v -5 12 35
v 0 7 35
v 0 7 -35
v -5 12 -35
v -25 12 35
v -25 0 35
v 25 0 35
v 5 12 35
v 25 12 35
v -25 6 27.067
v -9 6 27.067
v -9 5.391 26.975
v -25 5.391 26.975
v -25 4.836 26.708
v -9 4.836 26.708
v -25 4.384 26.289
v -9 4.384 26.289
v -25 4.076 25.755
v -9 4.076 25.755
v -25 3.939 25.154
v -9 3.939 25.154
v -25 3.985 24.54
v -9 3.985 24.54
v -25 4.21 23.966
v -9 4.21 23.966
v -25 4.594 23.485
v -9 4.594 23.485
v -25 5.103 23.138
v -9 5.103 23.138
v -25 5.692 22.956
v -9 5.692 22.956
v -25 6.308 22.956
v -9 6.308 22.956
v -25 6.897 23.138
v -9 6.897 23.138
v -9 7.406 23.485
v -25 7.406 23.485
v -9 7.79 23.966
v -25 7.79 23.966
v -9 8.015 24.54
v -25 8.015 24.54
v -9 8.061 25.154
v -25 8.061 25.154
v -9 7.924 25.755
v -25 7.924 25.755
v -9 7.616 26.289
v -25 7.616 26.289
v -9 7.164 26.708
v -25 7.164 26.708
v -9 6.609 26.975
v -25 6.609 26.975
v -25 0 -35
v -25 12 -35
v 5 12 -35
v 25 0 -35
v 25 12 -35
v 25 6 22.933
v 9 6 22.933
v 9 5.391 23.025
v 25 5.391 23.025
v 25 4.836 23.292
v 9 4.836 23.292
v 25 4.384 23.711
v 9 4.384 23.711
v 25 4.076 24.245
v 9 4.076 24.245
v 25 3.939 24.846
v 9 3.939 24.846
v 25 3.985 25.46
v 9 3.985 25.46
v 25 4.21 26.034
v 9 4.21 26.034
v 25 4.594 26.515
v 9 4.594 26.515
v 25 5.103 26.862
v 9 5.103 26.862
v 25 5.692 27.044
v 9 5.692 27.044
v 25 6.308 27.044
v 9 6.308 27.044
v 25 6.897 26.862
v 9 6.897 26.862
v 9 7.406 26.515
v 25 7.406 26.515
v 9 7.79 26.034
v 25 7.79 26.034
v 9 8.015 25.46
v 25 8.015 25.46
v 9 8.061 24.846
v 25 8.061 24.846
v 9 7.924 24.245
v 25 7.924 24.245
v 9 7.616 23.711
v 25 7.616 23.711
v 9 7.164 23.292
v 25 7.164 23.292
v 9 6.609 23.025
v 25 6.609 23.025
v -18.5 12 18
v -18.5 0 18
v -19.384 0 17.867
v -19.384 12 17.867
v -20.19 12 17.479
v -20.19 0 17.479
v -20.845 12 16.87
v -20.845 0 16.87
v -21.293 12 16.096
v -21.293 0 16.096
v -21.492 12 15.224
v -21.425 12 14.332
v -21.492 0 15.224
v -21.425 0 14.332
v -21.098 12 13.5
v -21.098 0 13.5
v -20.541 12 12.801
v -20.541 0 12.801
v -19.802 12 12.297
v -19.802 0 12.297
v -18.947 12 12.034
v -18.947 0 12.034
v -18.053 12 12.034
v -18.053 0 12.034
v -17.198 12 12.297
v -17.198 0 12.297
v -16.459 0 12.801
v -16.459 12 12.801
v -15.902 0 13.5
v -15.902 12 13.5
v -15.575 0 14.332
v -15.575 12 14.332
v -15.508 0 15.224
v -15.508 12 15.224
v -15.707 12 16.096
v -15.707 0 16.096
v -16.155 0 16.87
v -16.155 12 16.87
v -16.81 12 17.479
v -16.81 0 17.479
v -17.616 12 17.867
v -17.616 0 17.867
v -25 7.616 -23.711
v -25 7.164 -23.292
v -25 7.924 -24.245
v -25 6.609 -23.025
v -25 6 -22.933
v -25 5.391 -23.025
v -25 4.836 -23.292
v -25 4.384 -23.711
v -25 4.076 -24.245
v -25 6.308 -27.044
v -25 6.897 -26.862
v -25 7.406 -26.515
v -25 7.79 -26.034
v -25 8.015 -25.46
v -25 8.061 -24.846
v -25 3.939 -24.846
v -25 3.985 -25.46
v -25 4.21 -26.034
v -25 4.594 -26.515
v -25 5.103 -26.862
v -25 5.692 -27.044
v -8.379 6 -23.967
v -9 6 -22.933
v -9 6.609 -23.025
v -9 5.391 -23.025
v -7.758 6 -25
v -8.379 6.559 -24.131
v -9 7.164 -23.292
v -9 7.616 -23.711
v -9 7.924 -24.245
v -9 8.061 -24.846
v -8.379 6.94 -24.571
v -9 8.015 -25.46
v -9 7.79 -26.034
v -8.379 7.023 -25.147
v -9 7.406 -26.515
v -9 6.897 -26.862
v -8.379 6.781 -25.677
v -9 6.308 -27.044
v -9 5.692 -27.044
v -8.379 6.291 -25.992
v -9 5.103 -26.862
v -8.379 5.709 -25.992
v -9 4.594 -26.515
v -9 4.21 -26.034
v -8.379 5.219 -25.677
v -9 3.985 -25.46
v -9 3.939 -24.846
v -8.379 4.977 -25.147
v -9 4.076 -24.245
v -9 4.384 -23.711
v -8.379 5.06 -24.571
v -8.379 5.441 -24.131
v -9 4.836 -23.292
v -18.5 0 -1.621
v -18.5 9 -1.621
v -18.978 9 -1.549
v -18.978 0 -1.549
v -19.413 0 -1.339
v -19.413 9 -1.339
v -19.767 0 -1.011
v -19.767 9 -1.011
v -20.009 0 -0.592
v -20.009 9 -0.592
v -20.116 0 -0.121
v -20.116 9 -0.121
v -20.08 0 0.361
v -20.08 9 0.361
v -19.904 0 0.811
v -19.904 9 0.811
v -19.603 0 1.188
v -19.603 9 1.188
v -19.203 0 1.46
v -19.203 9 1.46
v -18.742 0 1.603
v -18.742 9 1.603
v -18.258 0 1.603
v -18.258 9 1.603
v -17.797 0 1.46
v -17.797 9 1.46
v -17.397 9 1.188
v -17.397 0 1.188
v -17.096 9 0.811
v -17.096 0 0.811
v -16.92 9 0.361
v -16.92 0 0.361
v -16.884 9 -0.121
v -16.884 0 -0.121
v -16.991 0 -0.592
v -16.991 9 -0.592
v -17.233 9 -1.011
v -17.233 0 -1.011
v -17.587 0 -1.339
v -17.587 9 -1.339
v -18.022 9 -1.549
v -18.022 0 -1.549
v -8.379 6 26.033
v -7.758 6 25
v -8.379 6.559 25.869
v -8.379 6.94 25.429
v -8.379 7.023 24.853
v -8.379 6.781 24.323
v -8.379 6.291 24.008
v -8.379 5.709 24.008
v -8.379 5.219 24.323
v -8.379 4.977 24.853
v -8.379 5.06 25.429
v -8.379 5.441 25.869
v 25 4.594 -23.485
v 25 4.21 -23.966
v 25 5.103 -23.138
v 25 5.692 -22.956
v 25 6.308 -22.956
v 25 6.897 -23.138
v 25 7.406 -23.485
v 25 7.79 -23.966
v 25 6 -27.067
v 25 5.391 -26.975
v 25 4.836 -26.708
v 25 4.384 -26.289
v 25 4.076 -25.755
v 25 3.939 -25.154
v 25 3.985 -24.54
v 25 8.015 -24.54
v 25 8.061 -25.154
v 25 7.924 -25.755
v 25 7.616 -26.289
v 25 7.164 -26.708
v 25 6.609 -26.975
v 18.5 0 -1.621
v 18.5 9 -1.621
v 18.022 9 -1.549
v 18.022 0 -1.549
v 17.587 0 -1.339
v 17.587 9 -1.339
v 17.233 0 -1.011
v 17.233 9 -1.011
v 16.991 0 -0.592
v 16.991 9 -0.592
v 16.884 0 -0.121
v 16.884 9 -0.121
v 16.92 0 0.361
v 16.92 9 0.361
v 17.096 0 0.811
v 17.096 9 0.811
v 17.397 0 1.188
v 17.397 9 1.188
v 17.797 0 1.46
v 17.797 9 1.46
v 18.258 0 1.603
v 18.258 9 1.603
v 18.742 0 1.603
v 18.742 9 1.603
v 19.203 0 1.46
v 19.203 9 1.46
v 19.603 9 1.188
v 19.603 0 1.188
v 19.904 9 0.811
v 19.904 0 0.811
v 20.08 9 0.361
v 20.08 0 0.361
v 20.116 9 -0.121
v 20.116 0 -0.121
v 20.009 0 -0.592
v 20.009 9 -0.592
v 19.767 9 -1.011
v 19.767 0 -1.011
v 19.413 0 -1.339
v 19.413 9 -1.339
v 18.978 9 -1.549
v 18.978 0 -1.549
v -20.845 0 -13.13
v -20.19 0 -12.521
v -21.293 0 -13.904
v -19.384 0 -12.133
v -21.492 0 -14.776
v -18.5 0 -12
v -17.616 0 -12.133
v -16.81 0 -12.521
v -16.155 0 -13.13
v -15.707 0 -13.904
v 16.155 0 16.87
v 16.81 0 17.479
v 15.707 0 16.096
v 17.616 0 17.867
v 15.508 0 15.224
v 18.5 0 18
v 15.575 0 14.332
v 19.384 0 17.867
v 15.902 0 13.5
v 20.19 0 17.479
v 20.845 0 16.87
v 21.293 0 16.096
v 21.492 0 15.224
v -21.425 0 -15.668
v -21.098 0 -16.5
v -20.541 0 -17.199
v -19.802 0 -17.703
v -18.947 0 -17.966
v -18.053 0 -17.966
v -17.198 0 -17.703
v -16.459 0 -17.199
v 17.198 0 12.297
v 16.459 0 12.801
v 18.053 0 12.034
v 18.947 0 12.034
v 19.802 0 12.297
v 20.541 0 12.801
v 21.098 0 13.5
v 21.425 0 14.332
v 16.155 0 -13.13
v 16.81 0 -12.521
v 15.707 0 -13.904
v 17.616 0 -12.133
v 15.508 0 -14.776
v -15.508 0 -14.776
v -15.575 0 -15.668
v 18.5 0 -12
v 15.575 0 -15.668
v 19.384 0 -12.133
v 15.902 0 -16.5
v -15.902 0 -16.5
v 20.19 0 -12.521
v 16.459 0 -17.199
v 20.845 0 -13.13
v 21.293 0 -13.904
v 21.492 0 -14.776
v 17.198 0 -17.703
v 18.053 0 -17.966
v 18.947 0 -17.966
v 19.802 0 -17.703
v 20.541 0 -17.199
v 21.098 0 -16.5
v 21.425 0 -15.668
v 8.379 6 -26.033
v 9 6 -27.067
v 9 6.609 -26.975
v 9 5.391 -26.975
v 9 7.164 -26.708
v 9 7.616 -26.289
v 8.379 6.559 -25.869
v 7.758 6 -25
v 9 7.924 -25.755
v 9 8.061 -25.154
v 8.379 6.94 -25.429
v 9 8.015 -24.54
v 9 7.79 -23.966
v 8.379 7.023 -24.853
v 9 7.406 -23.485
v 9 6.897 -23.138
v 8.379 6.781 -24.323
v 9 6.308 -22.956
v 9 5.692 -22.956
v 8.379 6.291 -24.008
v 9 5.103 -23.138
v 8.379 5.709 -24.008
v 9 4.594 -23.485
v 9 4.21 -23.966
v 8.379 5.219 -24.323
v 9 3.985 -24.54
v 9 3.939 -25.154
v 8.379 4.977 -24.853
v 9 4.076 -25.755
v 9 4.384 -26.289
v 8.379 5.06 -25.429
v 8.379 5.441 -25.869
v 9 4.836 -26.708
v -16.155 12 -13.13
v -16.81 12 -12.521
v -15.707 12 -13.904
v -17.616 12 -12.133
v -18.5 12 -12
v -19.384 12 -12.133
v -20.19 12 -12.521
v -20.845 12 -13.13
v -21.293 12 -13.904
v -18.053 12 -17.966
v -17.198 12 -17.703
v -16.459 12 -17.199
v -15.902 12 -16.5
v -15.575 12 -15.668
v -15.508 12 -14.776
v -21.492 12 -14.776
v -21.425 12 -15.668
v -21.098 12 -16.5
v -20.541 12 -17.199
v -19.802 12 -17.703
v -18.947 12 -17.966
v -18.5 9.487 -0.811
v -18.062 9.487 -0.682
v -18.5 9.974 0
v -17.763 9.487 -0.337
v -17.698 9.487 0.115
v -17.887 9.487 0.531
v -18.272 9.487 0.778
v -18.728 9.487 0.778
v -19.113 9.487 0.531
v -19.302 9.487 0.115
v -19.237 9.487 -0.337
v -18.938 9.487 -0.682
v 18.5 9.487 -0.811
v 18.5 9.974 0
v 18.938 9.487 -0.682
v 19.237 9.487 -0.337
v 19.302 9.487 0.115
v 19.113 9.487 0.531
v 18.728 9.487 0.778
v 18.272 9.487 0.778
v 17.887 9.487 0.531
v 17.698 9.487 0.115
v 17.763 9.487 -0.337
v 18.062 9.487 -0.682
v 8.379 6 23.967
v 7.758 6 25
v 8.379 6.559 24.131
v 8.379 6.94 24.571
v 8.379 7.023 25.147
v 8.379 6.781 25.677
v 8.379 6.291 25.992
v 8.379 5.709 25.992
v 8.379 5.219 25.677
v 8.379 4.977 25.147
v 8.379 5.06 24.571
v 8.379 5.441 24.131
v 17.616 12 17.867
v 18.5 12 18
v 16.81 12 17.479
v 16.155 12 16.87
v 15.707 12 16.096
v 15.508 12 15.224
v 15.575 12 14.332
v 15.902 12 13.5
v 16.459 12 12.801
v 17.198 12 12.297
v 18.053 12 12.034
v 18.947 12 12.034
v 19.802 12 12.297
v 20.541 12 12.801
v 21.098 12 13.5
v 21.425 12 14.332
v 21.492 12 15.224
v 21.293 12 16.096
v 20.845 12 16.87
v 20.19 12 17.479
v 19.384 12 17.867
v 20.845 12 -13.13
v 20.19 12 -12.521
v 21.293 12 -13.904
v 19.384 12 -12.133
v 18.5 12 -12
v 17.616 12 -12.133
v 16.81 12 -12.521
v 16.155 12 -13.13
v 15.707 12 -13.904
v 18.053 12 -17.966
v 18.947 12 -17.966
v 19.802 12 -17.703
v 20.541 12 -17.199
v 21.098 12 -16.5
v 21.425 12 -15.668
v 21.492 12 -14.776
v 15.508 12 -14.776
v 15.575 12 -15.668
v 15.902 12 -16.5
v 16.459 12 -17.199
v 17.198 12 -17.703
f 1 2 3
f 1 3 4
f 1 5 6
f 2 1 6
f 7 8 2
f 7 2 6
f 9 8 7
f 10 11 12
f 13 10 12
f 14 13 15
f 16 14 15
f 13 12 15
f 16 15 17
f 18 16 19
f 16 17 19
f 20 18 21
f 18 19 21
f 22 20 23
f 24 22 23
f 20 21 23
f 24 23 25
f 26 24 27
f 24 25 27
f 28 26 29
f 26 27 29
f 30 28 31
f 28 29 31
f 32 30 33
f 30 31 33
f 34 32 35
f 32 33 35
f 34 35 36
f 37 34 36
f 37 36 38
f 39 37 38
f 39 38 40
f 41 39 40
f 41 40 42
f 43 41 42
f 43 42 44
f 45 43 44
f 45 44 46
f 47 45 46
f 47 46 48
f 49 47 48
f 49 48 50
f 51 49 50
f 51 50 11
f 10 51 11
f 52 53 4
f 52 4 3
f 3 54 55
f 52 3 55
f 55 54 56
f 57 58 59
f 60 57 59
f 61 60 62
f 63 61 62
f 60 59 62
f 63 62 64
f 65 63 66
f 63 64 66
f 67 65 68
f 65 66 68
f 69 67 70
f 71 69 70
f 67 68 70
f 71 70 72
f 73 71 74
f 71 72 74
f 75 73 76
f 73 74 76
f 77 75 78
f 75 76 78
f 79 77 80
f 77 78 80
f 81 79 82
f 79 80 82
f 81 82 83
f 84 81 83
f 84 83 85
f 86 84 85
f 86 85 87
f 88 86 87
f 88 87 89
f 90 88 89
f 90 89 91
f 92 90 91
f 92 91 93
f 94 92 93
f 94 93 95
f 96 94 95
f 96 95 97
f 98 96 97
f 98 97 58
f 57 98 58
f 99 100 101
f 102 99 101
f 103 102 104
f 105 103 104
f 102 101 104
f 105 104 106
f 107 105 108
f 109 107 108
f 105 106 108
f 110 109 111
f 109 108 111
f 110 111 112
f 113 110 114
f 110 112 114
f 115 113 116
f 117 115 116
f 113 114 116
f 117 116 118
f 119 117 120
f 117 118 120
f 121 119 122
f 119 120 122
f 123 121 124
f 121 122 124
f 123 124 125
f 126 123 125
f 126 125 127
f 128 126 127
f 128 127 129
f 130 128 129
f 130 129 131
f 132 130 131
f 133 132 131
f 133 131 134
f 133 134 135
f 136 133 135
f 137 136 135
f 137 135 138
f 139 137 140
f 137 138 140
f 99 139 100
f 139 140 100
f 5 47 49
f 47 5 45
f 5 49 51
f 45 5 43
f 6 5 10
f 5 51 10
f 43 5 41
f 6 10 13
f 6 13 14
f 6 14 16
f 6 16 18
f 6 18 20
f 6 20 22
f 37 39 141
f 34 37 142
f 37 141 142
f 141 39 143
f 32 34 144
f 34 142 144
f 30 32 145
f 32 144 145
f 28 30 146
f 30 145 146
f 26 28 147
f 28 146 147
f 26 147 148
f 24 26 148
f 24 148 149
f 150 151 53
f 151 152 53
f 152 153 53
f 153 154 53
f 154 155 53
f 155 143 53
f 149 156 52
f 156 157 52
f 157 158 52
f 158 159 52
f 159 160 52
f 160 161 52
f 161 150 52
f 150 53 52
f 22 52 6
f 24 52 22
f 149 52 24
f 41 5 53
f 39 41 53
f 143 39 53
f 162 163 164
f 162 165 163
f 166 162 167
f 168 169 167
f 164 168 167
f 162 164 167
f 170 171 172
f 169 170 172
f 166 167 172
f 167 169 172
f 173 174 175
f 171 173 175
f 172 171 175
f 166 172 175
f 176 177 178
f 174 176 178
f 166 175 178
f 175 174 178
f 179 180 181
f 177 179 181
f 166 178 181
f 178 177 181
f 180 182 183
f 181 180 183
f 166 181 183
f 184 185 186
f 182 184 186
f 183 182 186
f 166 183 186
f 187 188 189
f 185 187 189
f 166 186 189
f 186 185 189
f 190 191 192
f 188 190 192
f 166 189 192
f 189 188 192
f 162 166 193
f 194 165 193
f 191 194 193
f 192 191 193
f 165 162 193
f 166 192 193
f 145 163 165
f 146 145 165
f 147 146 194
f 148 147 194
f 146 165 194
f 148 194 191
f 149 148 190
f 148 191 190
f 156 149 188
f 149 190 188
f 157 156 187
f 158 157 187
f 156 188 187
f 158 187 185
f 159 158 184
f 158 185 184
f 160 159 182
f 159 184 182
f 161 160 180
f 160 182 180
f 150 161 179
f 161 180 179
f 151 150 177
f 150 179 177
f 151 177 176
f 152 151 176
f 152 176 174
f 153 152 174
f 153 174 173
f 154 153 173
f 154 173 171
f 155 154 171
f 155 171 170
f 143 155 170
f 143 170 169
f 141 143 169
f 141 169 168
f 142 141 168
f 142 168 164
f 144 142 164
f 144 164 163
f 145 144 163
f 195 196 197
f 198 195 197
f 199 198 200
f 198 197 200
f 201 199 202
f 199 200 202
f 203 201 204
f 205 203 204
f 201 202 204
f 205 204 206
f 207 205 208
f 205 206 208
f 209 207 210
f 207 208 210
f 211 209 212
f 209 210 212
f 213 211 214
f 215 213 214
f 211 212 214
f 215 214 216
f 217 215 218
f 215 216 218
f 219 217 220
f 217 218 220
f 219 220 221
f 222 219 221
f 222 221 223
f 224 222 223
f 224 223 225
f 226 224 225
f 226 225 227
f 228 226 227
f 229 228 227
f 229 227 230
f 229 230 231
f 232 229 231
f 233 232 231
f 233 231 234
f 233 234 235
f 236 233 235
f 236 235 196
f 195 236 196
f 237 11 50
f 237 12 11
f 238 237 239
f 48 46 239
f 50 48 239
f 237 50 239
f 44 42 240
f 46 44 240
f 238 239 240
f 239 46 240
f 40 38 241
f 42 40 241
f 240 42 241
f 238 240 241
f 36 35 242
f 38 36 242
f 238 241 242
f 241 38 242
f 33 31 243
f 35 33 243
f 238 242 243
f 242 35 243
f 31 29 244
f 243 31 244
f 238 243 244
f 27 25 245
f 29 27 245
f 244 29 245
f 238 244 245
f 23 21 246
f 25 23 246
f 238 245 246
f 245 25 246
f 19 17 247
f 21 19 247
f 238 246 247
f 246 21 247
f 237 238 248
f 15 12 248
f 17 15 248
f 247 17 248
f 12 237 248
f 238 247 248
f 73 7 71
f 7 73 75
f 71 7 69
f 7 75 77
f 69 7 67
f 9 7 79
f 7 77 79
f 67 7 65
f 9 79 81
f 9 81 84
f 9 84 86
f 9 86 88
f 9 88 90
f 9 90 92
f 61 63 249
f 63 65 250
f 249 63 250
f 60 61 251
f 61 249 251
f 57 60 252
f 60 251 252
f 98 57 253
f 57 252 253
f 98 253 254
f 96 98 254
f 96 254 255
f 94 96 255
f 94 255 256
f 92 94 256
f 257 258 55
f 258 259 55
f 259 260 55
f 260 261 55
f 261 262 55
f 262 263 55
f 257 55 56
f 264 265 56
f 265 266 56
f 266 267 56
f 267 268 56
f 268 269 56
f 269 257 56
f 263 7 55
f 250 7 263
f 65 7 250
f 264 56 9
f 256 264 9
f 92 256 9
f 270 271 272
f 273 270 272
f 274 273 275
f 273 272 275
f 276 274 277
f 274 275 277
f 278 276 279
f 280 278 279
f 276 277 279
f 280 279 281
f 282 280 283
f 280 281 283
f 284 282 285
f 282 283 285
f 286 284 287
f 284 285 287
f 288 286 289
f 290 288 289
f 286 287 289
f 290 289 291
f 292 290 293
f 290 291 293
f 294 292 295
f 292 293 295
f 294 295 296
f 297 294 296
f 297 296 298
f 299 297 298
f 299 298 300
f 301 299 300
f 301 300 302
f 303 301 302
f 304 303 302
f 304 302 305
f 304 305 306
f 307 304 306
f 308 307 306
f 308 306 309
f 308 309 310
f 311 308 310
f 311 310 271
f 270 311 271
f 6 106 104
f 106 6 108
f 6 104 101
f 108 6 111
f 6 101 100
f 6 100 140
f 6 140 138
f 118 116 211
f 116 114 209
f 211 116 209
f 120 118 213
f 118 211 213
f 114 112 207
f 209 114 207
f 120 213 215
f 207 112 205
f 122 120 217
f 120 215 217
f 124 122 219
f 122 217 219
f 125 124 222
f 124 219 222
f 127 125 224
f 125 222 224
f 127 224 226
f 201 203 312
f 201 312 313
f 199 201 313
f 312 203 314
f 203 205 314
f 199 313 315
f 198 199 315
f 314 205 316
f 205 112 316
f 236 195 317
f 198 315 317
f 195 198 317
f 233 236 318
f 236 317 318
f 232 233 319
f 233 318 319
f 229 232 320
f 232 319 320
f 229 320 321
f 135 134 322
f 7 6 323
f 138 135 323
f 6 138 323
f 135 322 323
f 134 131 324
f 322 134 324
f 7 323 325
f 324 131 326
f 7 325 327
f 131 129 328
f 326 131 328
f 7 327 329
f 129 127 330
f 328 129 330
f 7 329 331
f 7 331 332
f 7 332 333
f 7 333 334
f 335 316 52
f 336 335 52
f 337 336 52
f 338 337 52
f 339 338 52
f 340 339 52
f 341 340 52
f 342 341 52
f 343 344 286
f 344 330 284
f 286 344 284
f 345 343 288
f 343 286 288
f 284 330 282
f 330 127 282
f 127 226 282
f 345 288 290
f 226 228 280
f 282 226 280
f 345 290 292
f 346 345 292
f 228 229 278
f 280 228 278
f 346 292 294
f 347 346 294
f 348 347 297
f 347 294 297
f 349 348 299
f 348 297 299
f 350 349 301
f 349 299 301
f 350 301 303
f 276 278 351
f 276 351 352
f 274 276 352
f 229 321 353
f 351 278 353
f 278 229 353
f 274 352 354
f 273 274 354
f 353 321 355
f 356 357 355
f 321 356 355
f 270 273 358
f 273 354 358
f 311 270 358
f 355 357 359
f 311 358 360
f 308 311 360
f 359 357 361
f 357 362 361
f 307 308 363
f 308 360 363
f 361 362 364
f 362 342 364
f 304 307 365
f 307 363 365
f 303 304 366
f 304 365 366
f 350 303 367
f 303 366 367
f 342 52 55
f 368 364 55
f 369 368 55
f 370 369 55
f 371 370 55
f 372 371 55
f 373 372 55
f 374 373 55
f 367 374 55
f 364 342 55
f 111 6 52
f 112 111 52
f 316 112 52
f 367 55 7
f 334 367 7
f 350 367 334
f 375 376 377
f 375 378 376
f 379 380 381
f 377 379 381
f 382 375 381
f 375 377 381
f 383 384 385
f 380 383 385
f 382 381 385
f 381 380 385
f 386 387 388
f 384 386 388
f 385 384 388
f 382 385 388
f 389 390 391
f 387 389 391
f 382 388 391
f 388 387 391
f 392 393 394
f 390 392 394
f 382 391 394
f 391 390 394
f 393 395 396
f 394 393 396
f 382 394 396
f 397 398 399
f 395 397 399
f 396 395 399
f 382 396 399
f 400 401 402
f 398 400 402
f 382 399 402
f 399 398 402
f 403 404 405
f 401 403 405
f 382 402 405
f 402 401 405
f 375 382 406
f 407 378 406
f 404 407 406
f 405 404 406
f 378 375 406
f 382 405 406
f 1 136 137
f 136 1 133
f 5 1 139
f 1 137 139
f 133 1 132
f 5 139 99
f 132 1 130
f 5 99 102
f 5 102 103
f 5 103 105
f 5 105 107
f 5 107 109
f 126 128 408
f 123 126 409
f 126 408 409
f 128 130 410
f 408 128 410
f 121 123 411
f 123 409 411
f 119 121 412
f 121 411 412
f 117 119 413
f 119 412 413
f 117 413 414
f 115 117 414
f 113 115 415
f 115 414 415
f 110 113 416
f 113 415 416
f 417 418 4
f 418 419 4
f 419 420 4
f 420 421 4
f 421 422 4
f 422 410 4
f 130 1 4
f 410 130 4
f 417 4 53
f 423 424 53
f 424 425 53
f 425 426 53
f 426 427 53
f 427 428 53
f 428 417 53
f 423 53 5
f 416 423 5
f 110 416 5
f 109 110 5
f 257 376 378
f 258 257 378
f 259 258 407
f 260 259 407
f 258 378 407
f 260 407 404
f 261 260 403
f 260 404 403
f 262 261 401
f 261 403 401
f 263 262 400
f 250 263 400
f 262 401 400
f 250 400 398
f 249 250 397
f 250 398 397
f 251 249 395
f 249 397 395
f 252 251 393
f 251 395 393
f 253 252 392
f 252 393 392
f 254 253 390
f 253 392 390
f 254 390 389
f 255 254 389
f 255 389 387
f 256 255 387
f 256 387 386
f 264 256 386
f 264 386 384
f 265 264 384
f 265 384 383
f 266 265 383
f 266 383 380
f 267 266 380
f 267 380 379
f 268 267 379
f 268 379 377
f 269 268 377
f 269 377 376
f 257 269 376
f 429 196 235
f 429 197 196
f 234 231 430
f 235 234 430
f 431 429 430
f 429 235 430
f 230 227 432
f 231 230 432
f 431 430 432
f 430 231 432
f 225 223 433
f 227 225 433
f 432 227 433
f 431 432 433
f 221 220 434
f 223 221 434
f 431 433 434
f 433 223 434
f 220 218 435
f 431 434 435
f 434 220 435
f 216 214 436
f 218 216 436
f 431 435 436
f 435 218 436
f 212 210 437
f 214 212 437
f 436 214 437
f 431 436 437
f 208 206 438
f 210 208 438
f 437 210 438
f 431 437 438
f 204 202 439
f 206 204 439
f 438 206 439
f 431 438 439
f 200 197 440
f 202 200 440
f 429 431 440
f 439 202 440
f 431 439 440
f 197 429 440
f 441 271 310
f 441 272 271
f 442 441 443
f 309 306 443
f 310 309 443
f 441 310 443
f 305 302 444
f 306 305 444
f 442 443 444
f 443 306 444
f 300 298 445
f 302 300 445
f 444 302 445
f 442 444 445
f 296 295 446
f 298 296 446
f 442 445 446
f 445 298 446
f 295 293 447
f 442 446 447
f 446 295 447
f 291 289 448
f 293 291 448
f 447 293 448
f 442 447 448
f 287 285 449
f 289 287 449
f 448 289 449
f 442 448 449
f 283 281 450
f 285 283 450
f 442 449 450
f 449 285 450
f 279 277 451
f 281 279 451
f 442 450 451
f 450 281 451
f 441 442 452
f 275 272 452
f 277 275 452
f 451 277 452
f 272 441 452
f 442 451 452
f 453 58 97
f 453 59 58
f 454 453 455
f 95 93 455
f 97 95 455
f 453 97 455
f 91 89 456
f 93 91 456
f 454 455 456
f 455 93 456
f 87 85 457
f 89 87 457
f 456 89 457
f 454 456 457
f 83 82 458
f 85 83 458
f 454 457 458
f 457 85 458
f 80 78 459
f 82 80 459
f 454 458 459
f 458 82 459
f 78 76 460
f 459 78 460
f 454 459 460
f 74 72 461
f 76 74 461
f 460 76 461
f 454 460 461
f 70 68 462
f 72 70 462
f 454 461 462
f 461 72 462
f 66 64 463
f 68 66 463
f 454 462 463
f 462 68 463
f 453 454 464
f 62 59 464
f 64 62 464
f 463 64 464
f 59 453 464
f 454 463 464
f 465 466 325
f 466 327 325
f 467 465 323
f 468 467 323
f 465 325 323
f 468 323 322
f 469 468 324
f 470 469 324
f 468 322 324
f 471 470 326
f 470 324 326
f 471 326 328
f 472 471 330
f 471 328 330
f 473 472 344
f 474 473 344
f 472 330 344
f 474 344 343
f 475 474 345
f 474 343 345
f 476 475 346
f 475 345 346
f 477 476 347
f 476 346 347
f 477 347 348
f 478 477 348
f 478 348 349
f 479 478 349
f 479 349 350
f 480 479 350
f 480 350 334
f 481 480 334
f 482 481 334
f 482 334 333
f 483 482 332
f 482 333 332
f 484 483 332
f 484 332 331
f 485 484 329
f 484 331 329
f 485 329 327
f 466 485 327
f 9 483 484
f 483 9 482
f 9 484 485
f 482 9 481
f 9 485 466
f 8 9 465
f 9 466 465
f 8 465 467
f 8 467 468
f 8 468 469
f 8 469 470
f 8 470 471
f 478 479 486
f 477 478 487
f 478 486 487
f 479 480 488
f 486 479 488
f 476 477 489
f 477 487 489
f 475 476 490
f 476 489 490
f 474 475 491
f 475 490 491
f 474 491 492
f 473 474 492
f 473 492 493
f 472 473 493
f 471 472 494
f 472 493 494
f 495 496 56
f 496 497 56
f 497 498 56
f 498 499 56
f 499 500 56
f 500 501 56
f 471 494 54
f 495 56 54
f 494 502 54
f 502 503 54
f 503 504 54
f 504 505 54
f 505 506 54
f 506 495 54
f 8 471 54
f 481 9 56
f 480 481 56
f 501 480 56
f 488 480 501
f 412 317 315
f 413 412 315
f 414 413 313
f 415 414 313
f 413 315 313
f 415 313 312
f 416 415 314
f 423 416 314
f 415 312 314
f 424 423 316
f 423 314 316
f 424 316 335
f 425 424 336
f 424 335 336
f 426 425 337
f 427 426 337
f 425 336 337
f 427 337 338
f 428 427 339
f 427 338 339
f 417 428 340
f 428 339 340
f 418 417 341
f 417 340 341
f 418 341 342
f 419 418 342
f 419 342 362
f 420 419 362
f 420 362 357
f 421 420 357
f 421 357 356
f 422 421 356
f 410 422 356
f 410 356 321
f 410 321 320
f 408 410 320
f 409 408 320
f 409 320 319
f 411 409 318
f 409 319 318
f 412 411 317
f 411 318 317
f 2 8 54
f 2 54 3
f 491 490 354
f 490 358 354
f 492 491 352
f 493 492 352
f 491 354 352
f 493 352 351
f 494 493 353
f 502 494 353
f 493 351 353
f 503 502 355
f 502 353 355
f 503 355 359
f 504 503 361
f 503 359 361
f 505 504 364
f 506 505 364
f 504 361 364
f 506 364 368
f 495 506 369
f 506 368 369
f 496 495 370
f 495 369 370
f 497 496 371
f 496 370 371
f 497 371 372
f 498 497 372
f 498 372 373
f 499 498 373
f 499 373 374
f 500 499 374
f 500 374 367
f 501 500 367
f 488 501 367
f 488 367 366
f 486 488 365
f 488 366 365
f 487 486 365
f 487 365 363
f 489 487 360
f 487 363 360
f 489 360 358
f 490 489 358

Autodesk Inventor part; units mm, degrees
ref_plane "YZ Plane" through (0, 0, 0) normal (1, 0, 0) x (0, 1, 0)
ref_plane "XZ Plane" through (0, 0, 0) normal (0, 1, 0) x (-1, 0, 0)
ref_plane "XY Plane" through (0, 0, 0) normal (0, 0, 1) x (1, 0, 0)
sketch "Skizze_Grundkörper" plane through (0, 0, 0) normal (0, 0, 1) x (1, 0, 0)
  line L0 (-25, 0) -> (25, 0)
  line L1 (25, 0) -> (25, 12)
  line L2 (25, 12) -> (5, 12)
  line L3 (-35, 0) -> (35, 0)
  line L4 (0, -2.4) -> (0, 14.4)
  line L5 (5, 12) -> (0, 7)
  line L6 (0, 7) -> (-5, 12)
  line L7 (-5, 12) -> (-25, 12)
  line L8 (-25, 12) -> (-25, 0)
  point P0 (0, 0)
  dimension "Breite" = 50
  dimension "Höhe" = 12
  dimension "Nuttiefe" = 5
  dimension "Nutwinkel" = 90
extrude "Grundkörper" add sketch "Skizze_Grundkörper" along normal mid plane 70
sketch "Skizze_Bohrung_6H7" plane through (-25, 12, 35) normal (0, 1, 0) x (1, 0, 0)
  line L0 (-10, 35) -> (60, 35)
  line L1 (25, 84) -> (25, -14)
  point P0 (25, 35)
  point P1 (6.5, 50)
  point P2 (43.5, 50)
  point P3 (43.5, 20)
  point P4 (6.5, 20)
  dimension "Abstand_Breite_Bohrung_6H7" = 37
  dimension "Abstand_Länge_Bohrung_6H7" = 30
hole "Bohrung_6H7" at (-18.5, 12, -15) at (18.5, 12, -15) at (18.5, 12, 15) at (-18.5, 12, 15) direction (0, -1, 0) diameter 6 end through all
sketch "Skizze_Gewinde_M4" plane through (-25, 0, 35) normal (0, -1, 0) x (1, 0, 0)
  line L0 (-10, -35) -> (60, -35)
  line L1 (25, -84) -> (25, 14)
  point P0 (25, -35)
  point P1 (6.5, -35)
  point P2 (43.5, -35)
  dimension "Abstand_Breite_Gewinde_M4" = 37
hole "Gewinde_M4" at (-18.5, 0, 0) at (18.5, 0, 0) direction (0, 1, 0) diameter 3.242 depth 9 tip angle 118
sketch "Skizze_Gewinde_M5" plane through (25, 0, 35) normal (1, 0, 0) x (0, 0, -1)
  line L0 (35, -2.4) -> (35, 14.4)
  line L1 (84, 0) -> (-14, 0)
  point P0 (35, 0)
  point P1 (10, 6)
  point P2 (60, 6)
  dimension "Abstand_Länge_Gewinde_M5" = 50
  dimension "Abstand_Höhe_Gewinde_M5" = 6
hole "Gewinde_M5" at (25, 6, 25) at (25, 6, -25) direction (-1, 0, 0) diameter 4.134 depth 16 tip angle 118
pattern_circular "Anordnung_Gewinde_M5" count 2 over 360 about axis through (0, -10, 0) along (0, 1, 0) of "Gewinde_M5"
equation "\"Abstand_Höhe_Gewinde_M5\" = 0.5 * Höhe"
properties part number "Unterstempel_2016_iLogic"
